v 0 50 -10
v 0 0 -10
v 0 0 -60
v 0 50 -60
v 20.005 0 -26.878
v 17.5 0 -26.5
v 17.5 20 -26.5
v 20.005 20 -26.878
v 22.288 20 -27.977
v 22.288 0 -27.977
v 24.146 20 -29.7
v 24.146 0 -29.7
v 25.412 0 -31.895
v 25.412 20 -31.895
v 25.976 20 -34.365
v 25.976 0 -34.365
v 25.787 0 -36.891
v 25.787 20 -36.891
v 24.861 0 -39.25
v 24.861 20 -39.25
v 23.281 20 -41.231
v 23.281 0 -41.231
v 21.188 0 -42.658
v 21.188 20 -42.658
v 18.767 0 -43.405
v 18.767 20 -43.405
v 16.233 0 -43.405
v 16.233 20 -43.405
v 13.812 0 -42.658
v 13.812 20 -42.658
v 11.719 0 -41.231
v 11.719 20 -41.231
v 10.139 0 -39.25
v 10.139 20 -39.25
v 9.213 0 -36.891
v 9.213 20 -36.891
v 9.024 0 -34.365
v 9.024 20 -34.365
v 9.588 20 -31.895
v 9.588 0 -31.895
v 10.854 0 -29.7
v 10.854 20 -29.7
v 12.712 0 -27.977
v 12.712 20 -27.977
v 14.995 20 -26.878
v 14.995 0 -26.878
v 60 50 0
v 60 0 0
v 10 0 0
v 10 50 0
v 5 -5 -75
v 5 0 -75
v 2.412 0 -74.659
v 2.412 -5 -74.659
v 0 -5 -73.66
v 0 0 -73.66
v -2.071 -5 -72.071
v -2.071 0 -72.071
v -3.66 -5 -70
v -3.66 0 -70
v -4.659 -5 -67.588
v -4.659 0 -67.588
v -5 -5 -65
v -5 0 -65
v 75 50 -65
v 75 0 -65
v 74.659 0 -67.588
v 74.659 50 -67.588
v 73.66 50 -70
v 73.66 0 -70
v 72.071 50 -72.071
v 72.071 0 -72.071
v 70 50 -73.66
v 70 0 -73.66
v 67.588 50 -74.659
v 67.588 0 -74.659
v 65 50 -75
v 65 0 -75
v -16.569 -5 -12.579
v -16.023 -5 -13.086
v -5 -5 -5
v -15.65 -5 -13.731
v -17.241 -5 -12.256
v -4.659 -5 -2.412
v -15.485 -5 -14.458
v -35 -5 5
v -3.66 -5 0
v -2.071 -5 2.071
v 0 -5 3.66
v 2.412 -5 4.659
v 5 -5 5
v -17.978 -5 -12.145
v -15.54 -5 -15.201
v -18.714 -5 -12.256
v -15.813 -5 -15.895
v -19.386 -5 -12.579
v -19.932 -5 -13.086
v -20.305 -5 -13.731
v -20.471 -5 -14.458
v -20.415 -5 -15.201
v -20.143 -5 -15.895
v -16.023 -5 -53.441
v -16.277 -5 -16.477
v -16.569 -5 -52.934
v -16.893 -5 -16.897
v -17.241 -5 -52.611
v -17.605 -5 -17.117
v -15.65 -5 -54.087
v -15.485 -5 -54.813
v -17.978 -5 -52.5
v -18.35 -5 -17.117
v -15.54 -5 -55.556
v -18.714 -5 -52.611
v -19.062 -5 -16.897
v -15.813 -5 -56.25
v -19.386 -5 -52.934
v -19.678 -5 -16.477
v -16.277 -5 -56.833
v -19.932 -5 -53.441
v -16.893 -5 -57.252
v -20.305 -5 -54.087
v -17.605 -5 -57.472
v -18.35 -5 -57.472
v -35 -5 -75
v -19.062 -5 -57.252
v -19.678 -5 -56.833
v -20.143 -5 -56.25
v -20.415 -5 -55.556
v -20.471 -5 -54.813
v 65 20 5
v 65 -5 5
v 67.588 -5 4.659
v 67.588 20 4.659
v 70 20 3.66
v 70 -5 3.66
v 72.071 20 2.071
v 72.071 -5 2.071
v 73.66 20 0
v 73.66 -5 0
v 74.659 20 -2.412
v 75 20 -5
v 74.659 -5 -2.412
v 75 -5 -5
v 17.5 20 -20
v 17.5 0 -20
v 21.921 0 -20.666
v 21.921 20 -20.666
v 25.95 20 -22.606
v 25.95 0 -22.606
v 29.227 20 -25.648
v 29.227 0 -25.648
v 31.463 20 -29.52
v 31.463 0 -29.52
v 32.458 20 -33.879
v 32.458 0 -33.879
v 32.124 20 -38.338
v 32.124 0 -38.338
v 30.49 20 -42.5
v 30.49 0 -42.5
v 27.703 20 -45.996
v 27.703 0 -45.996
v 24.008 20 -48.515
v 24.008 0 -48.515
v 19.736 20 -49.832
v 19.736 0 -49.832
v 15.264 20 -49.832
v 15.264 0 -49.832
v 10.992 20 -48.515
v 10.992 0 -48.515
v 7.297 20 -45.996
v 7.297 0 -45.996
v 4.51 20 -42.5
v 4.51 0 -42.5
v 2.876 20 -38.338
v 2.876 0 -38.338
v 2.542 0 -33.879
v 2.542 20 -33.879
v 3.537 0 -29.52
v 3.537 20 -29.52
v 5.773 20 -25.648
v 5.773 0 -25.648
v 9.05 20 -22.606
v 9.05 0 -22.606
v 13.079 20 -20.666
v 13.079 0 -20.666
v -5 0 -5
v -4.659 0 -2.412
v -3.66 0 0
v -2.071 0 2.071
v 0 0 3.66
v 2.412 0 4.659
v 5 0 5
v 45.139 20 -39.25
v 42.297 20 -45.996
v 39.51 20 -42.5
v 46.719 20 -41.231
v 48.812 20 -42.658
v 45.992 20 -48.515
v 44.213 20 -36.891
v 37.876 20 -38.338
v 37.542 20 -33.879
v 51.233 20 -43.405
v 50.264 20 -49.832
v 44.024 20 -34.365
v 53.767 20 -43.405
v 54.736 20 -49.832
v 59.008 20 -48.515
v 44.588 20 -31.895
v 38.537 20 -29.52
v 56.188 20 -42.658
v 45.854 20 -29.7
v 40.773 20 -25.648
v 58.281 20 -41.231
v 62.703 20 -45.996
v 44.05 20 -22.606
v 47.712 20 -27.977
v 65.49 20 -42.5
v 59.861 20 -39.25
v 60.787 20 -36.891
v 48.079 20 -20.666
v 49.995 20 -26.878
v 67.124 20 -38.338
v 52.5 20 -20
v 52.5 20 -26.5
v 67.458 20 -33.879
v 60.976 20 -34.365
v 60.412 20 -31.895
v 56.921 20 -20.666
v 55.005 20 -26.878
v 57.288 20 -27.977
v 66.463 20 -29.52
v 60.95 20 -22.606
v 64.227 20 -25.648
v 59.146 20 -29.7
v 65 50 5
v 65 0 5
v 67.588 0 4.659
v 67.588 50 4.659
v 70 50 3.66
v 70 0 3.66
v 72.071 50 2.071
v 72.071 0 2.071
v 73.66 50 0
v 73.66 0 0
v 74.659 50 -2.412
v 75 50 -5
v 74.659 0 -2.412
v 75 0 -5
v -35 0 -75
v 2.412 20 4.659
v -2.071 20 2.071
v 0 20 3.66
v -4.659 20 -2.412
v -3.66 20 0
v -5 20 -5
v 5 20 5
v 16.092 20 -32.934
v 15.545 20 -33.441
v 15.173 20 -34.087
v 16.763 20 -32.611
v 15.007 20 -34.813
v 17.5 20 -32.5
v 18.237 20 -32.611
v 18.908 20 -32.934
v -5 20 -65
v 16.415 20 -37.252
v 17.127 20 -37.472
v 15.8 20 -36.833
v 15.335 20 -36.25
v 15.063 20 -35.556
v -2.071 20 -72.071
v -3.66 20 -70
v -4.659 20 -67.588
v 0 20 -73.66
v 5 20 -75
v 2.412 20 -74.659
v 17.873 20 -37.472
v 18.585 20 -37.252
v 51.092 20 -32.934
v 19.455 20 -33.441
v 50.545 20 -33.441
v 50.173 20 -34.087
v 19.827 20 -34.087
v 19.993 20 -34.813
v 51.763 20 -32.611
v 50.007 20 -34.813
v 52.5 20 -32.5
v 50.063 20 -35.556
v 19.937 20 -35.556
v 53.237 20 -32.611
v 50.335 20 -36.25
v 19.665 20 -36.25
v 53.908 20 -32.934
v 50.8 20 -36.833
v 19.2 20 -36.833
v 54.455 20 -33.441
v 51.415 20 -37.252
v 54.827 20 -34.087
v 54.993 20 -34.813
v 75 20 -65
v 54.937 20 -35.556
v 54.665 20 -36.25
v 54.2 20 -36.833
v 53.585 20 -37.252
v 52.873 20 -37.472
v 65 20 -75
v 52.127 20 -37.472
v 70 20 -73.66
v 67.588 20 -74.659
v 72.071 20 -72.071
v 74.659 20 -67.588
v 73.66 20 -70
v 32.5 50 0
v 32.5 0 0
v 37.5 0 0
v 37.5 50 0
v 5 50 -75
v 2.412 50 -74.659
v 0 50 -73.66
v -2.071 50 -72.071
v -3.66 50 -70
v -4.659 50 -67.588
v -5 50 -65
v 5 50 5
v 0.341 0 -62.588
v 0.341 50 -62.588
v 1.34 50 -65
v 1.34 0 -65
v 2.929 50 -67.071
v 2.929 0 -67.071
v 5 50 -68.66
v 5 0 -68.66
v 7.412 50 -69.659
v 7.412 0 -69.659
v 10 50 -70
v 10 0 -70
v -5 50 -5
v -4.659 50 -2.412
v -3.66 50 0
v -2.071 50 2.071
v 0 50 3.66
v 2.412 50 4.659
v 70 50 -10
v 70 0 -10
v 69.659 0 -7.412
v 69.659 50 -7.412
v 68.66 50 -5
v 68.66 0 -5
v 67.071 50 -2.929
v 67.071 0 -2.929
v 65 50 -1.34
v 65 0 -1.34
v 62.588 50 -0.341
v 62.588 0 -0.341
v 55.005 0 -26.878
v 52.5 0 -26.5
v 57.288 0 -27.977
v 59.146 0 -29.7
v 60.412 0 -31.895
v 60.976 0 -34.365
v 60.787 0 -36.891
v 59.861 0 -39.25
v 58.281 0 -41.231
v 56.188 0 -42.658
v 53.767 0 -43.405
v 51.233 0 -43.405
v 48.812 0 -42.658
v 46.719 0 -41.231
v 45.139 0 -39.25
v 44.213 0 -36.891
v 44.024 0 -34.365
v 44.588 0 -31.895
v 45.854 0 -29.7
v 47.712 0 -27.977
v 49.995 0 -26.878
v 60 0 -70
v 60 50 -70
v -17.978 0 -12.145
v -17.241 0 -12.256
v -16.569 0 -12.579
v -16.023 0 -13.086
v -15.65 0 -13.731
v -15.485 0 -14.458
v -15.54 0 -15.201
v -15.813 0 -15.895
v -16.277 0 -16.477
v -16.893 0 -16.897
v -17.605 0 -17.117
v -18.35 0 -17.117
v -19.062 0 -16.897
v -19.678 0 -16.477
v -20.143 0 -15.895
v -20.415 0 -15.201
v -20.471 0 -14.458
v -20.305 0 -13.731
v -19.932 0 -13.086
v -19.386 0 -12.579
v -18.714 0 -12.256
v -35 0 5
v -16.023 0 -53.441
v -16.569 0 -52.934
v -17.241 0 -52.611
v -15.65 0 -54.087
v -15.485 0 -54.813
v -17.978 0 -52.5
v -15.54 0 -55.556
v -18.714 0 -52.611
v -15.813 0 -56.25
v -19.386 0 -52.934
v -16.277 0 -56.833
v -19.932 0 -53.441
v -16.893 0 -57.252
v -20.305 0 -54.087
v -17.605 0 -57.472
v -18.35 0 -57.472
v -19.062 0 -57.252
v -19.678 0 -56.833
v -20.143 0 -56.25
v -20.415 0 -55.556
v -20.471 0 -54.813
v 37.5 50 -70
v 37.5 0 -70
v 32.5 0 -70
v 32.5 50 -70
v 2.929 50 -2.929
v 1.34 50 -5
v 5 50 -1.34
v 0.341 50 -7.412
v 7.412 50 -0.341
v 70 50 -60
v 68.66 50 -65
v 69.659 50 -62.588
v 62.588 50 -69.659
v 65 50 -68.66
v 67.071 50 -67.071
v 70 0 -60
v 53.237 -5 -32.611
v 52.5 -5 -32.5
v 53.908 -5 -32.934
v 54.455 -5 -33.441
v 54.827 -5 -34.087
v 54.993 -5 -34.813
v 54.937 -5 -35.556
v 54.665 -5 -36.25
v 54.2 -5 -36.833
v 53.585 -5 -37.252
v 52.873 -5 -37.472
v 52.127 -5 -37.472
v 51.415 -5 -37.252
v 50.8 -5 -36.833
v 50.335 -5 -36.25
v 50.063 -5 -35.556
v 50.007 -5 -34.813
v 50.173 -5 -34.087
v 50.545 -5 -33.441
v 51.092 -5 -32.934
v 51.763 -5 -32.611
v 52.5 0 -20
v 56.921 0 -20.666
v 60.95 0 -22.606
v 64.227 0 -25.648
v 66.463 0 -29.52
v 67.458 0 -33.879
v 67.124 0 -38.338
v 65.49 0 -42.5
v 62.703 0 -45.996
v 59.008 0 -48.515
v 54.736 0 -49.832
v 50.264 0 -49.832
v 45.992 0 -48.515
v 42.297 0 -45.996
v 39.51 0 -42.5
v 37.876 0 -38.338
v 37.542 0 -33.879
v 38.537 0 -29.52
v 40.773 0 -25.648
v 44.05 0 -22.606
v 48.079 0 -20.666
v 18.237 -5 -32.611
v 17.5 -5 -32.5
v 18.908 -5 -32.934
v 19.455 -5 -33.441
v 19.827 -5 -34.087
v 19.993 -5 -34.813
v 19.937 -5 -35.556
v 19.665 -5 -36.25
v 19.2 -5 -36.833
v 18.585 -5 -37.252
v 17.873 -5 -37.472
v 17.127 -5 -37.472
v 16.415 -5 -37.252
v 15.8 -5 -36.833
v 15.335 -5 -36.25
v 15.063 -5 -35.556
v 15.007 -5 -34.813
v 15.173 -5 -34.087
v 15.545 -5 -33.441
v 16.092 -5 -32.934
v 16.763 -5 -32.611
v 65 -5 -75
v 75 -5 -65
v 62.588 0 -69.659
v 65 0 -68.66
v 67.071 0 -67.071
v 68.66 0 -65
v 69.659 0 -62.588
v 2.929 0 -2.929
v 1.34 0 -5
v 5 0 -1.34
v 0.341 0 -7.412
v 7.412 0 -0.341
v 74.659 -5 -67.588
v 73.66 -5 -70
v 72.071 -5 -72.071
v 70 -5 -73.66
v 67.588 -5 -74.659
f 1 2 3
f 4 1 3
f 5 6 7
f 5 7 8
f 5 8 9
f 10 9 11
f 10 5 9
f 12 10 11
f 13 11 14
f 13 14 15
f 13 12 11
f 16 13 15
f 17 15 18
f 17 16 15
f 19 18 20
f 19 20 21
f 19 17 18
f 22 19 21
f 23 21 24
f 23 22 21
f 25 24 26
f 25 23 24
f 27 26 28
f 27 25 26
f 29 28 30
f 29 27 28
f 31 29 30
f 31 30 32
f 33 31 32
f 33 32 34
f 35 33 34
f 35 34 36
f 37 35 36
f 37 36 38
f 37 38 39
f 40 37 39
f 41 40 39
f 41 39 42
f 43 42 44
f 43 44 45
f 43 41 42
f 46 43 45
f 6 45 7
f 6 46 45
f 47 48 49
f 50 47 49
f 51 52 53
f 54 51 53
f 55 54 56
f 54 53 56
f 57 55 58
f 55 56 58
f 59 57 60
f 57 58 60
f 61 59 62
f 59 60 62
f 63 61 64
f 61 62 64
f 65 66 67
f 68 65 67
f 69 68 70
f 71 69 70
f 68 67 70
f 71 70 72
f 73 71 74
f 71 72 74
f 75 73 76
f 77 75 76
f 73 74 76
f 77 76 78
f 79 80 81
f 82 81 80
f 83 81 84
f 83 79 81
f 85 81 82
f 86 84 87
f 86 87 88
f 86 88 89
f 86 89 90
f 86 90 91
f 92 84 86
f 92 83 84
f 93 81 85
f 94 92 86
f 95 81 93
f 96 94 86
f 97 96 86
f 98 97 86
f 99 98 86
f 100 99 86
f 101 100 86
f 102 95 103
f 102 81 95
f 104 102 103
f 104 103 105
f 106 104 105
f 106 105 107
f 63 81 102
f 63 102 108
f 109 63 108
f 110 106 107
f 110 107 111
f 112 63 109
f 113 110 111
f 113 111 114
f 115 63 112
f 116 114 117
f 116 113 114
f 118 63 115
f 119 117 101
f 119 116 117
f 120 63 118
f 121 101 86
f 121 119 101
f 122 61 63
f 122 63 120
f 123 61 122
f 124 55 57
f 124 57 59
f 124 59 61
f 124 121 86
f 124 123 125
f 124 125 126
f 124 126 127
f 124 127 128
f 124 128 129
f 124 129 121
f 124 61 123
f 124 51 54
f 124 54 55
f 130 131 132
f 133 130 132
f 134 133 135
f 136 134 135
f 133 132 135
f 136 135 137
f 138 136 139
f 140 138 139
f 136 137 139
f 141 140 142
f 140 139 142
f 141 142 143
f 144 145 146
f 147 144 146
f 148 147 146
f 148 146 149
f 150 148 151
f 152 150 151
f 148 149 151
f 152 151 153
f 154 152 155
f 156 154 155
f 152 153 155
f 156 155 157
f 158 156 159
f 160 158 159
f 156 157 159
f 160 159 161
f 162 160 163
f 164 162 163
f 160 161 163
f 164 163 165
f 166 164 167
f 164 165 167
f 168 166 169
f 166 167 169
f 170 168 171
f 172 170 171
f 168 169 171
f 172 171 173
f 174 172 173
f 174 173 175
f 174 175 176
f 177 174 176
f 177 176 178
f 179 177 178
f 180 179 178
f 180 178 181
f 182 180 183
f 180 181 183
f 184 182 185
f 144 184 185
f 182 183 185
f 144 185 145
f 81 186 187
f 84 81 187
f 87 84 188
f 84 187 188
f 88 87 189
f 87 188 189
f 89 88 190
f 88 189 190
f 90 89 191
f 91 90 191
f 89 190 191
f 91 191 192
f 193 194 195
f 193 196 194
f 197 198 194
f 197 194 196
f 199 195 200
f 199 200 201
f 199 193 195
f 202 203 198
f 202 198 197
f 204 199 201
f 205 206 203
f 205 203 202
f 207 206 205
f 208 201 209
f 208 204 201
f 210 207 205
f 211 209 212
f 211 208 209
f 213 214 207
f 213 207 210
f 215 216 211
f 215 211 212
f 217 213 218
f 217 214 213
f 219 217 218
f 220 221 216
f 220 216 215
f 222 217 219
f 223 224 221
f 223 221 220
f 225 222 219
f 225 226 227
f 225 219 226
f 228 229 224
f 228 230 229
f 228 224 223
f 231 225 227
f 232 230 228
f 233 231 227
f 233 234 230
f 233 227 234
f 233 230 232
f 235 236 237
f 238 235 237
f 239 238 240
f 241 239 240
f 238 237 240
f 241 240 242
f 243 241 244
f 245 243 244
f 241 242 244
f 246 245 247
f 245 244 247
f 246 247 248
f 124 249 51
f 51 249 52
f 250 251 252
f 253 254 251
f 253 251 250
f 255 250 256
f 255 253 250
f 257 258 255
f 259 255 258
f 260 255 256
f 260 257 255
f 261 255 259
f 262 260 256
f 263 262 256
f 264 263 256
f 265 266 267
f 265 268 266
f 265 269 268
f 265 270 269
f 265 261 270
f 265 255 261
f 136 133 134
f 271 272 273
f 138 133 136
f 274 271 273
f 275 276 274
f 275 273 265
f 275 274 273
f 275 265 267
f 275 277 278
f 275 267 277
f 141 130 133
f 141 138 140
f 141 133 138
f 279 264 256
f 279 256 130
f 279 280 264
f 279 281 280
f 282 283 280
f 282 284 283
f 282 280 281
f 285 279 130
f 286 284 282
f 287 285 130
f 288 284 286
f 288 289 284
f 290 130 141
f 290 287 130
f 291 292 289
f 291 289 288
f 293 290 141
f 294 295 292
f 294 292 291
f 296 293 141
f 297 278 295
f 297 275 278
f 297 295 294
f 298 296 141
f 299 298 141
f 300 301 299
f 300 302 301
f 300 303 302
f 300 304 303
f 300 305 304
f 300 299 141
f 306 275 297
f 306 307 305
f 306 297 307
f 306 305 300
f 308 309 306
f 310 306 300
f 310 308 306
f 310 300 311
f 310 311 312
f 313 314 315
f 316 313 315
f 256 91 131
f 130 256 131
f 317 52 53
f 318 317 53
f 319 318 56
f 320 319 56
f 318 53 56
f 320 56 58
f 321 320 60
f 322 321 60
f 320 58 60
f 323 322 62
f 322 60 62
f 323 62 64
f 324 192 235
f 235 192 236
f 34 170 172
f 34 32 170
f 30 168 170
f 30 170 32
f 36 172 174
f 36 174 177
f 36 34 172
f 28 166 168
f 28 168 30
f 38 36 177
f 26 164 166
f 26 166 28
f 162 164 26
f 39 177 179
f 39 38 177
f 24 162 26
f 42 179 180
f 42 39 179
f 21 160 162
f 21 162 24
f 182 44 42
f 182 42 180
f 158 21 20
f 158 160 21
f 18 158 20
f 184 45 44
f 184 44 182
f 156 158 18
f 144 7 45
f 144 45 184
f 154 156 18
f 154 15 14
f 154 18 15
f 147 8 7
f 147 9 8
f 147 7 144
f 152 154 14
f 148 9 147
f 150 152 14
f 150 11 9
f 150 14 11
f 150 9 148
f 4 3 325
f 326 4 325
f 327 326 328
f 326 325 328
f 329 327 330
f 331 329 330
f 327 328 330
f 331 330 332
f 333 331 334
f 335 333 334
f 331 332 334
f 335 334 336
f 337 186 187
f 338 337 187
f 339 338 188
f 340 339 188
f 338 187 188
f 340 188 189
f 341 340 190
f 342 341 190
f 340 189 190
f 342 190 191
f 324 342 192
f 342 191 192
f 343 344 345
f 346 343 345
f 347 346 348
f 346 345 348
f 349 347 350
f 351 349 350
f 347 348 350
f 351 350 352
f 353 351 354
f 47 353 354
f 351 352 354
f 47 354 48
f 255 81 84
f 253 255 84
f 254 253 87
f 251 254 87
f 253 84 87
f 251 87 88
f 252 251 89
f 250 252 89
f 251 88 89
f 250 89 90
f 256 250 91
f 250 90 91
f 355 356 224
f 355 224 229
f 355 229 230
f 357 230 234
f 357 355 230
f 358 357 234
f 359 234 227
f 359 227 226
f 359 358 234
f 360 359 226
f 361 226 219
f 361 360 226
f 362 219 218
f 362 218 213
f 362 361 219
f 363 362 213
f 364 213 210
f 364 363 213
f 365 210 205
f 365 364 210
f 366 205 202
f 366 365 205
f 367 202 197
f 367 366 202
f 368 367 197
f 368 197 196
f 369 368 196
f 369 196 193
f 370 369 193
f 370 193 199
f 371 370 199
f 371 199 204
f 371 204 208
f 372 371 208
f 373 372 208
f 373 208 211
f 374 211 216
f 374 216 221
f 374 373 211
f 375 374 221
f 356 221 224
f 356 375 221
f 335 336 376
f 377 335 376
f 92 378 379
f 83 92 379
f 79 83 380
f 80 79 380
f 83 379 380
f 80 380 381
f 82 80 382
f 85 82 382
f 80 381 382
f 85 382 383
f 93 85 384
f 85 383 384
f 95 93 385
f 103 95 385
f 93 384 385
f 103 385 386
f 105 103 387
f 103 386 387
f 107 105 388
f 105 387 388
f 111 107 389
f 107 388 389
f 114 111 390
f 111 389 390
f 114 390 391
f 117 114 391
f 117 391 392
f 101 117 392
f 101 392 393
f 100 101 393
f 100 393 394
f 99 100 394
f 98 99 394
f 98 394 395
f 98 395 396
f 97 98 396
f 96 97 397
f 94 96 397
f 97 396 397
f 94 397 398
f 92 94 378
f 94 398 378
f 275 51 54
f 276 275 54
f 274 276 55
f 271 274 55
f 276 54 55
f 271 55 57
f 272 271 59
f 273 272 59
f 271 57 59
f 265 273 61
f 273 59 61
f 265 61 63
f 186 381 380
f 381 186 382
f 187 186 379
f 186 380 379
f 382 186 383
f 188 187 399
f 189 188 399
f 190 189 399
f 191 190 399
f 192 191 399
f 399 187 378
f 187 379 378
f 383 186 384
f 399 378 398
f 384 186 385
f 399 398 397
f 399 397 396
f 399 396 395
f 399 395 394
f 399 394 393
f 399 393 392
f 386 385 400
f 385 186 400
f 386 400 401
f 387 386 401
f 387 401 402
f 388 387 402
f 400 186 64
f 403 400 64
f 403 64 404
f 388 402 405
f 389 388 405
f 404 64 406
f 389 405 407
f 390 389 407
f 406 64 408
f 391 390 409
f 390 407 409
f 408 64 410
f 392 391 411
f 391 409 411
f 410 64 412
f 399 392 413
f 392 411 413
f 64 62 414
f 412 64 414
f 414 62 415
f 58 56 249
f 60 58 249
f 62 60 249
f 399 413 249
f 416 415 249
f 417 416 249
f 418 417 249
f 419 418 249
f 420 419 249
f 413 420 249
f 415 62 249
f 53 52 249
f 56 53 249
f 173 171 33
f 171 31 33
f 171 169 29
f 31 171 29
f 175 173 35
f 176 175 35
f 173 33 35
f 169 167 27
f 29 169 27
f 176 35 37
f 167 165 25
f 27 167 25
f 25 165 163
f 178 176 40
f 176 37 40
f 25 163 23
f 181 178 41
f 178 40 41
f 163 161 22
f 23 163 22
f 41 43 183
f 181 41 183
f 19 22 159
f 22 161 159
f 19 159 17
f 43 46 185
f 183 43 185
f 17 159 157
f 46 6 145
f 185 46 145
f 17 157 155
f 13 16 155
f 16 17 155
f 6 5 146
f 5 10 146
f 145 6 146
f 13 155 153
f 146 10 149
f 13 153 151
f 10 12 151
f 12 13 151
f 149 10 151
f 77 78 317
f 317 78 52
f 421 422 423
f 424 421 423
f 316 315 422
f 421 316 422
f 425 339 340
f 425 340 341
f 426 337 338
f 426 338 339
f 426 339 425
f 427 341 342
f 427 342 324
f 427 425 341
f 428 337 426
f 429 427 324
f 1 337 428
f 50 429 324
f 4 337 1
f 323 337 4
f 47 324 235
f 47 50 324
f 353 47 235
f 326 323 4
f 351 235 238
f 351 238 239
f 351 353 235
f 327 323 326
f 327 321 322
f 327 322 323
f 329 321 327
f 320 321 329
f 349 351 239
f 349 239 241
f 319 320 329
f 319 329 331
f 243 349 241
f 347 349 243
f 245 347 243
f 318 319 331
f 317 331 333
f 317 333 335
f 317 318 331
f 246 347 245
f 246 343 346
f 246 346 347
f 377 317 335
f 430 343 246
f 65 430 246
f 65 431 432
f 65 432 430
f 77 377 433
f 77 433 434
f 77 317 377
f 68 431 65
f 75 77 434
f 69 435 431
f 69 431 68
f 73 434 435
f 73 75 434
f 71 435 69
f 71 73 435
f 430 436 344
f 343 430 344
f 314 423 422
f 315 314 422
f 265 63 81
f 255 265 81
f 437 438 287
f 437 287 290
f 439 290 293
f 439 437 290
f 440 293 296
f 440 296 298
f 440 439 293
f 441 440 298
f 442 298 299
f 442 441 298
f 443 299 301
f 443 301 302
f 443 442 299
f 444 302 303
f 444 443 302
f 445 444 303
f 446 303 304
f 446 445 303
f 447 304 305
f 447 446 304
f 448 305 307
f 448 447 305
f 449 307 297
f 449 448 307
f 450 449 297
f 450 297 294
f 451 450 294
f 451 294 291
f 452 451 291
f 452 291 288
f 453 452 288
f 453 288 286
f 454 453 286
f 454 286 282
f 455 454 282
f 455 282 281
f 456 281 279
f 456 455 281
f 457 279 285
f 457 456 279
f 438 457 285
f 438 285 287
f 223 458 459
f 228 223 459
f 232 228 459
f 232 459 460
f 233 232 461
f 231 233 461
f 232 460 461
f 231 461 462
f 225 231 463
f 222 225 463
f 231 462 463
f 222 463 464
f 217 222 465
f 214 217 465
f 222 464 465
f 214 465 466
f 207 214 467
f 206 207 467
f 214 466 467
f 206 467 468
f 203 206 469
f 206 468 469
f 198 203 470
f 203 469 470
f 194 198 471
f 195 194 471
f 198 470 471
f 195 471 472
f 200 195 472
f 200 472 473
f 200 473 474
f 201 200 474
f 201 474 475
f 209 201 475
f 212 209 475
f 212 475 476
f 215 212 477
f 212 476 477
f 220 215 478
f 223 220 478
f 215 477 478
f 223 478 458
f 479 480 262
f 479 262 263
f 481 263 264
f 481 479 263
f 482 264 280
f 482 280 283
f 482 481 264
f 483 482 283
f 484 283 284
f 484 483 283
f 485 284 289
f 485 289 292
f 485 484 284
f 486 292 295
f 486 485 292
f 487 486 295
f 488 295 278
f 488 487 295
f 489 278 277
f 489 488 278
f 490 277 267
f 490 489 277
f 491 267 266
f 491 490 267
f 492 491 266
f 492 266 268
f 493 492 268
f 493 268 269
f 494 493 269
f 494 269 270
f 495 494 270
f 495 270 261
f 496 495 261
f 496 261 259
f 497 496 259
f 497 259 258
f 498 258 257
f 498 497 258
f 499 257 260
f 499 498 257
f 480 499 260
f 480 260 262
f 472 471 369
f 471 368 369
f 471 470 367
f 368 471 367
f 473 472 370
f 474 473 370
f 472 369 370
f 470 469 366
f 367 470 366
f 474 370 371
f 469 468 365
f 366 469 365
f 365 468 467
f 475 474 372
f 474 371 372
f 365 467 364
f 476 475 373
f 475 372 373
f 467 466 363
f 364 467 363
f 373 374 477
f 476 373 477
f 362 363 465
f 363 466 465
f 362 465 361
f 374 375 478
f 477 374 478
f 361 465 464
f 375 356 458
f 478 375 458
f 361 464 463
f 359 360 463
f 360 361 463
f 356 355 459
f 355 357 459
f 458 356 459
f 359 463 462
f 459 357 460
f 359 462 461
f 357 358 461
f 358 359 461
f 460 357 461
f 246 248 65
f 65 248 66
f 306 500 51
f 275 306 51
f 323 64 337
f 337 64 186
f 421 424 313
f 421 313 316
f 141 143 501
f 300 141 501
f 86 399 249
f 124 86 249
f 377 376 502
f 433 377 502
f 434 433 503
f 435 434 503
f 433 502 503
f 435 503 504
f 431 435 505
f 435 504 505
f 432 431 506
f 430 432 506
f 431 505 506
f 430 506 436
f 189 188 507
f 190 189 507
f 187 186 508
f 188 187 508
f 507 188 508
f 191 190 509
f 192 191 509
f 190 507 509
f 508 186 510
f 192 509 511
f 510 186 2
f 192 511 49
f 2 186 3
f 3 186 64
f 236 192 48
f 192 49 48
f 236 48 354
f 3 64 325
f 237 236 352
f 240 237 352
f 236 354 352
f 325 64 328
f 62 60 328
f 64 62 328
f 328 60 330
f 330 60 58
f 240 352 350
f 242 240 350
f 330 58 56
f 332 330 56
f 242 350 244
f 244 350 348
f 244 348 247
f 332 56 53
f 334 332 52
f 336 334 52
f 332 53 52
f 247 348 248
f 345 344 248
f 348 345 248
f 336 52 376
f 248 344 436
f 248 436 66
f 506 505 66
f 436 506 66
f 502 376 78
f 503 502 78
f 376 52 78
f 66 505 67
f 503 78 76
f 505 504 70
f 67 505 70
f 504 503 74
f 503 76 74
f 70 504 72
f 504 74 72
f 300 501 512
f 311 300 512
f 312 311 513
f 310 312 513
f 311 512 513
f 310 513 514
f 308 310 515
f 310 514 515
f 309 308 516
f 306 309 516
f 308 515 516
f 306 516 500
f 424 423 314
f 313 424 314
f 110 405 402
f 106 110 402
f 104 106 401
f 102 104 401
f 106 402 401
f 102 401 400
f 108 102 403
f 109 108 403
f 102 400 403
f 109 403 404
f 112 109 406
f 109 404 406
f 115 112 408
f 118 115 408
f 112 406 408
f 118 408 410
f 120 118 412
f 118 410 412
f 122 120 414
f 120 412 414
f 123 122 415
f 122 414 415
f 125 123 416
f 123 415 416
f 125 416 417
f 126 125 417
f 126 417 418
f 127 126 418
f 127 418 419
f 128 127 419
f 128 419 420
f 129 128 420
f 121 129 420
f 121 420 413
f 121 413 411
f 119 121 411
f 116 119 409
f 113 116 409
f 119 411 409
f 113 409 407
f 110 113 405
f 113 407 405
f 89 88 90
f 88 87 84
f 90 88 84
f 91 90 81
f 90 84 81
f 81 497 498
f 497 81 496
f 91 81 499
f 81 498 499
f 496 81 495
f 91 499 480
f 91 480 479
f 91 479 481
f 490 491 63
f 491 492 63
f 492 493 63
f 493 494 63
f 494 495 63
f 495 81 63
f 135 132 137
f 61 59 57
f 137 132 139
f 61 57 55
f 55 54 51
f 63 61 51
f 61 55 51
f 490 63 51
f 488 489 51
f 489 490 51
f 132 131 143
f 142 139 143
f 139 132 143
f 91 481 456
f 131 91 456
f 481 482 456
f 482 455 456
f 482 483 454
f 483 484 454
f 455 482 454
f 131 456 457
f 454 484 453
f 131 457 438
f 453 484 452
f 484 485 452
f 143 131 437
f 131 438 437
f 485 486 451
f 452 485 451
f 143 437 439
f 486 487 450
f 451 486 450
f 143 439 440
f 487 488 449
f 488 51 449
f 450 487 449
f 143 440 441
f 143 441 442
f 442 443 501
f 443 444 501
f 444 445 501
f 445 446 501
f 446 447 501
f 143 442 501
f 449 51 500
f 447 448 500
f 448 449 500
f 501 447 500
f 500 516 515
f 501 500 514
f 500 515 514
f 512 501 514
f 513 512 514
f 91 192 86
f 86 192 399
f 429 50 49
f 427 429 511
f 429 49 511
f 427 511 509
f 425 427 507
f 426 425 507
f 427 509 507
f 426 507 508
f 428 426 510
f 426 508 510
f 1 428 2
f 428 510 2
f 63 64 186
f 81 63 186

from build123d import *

# Parameters (mm, degrees)
BOSS_EXTRUDE1_DEPTH      = 50
BOSS_EXTRUDE3_DEPTH      = 50
SKETCH2_6_R              = 15
SKETCH2_6_R_2            = 8.5
BOSS_EXTRUDE4_DEPTH      = 20
BOSS_EXTRUDE4_2_DEPTH    = 20
BOSS_EXTRUDE5_DEPTH      = 20
BOSS_EXTRUDE5_DEPTH_BACK = 5
SKETCH2_7_R              = 2.5
SKETCH2_8_R              = 2.5
BOSS_EXTRUDE6_DEPTH      = 5


with BuildPart() as part:
    # Sketch2 → Boss-Extrude1 (new body)
    with BuildSketch(Plane(origin=(0, 0, 0), x_dir=(1, 0, 0), z_dir=(0, 1, 0))):
        with BuildLine():
            Line((65, 75), (5, 75))
            ThreePointArc((5, 75), (-2.071067812, 72.071067812), (-5, 65))
            Line((-5, 65), (-5, 5))
            ThreePointArc((-5, 5), (-2.071067812, -2.071067812), (5, -5))
            Line((5, -5), (65, -5))
            ThreePointArc((65, -5), (72.071067812, -2.071067812), (75, 5))
            Line((75, 5), (75, 65))
            ThreePointArc((75, 65), (72.071067812, 72.071067812), (65, 75))
        make_face()
        with BuildLine():
            Line((10, 70), (32.5, 70))
            Line((32.5, 70), (37.5, 70))
            Line((37.5, 70), (60, 70))
            ThreePointArc((60, 70), (67.071067812, 67.071067812), (70, 60))
            Line((70, 60), (70, 10))
            ThreePointArc((70, 10), (67.071067812, 2.928932188), (60, 0))
            Line((60, 0), (37.5, 0))
            Line((37.5, 0), (32.5, 0))
            Line((32.5, 0), (10, 0))
            ThreePointArc((10, 0), (2.928932188, 2.928932188), (0, 10))
            Line((0, 10), (0, 60))
            ThreePointArc((0, 60), (2.928932188, 67.071067812), (10, 70))
        make_face(mode=Mode.SUBTRACT)
    extrude(amount=BOSS_EXTRUDE1_DEPTH)


with BuildPart() as body_2:
    # Sketch2<5> → Boss-Extrude3 (new body)
    with BuildSketch(Plane(origin=(0, 0, 0), x_dir=(1, 0, 0), z_dir=(0, 1, 0))):
        Polygon((32.5, 70), (32.5, 35), (32.5, 0), (37.5, 0), (37.5, 35), (37.5, 70), align=None)
    extrude(amount=BOSS_EXTRUDE3_DEPTH)


with BuildPart() as body_3:
    # Sketch2<6> → Boss-Extrude4 (new body)
    with BuildSketch(Plane(origin=(0, 0, 0), x_dir=(1, 0, 0), z_dir=(0, 1, 0))):
        with Locations((17.5, 35)):
            Circle(SKETCH2_6_R)
        with Locations((17.5, 35)):
            Circle(SKETCH2_6_R_2, mode=Mode.SUBTRACT)
    extrude(amount=BOSS_EXTRUDE4_DEPTH)


with BuildPart() as body_4:
    # Sketch2<6> → Boss-Extrude4 2 (new body)
    with BuildSketch(Plane(origin=(0, 0, 0), x_dir=(1, 0, 0), z_dir=(0, 1, 0))):
        with Locations((52.5, 35)):
            Circle(SKETCH2_6_R)
        with Locations((52.5, 35)):
            Circle(SKETCH2_6_R_2, mode=Mode.SUBTRACT)
    extrude(amount=BOSS_EXTRUDE4_2_DEPTH)


with BuildPart() as body_5:
    # Sketch2<7> → Boss-Extrude5 (new, two sides: drawn at the far end of the back side and taken through both)
    with BuildSketch(Plane(origin=(0, 0, 0), x_dir=(1, 0, 0), z_dir=(0, 1, 0)).offset(-BOSS_EXTRUDE5_DEPTH_BACK)):
        with BuildLine():
            Line((65, 75), (5, 75))
            ThreePointArc((5, 75), (-2.071067812, 72.071067812), (-5, 65))
            Line((-5, 65), (-5, 5))
            ThreePointArc((-5, 5), (-2.071067812, -2.071067812), (5, -5))
            Line((5, -5), (65, -5))
            ThreePointArc((65, -5), (72.071067812, -2.071067812), (75, 5))
            Line((75, 5), (75, 65))
            ThreePointArc((75, 65), (72.071067812, 72.071067812), (65, 75))
        make_face()
        with Locations((17.5, 35)):
            Circle(SKETCH2_7_R, mode=Mode.SUBTRACT)
        with Locations((52.5, 35)):
            Circle(SKETCH2_7_R, mode=Mode.SUBTRACT)
    extrude(amount=BOSS_EXTRUDE5_DEPTH + BOSS_EXTRUDE5_DEPTH_BACK)


with BuildPart() as body_6:
    # Sketch2<8> → Boss-Extrude6 (new body)
    with BuildSketch(Plane(origin=(0, 0, 0), x_dir=(1, 0, 0), z_dir=(0, 1, 0))):
        with BuildLine():
            ThreePointArc((-5, 65), (-2.071067812, 72.071067812), (5, 75))
            Line((5, 75), (-35, 75))
            Line((-35, 75), (-35, -5))
            Line((-35, -5), (5, -5))
            ThreePointArc((5, -5), (-2.071067812, -2.071067812), (-5, 5))
            Line((-5, 5), (-5, 65))
        make_face()
        with Locations((-17.977583799, 14.644574594)):
            Circle(SKETCH2_8_R, mode=Mode.SUBTRACT)
        with Locations((-17.977583799, 55)):
            Circle(SKETCH2_8_R, mode=Mode.SUBTRACT)
    extrude(amount=-BOSS_EXTRUDE6_DEPTH)


solid = Compound([part.part, body_2.part, body_3.part, body_4.part, body_5.part, body_6.part])
